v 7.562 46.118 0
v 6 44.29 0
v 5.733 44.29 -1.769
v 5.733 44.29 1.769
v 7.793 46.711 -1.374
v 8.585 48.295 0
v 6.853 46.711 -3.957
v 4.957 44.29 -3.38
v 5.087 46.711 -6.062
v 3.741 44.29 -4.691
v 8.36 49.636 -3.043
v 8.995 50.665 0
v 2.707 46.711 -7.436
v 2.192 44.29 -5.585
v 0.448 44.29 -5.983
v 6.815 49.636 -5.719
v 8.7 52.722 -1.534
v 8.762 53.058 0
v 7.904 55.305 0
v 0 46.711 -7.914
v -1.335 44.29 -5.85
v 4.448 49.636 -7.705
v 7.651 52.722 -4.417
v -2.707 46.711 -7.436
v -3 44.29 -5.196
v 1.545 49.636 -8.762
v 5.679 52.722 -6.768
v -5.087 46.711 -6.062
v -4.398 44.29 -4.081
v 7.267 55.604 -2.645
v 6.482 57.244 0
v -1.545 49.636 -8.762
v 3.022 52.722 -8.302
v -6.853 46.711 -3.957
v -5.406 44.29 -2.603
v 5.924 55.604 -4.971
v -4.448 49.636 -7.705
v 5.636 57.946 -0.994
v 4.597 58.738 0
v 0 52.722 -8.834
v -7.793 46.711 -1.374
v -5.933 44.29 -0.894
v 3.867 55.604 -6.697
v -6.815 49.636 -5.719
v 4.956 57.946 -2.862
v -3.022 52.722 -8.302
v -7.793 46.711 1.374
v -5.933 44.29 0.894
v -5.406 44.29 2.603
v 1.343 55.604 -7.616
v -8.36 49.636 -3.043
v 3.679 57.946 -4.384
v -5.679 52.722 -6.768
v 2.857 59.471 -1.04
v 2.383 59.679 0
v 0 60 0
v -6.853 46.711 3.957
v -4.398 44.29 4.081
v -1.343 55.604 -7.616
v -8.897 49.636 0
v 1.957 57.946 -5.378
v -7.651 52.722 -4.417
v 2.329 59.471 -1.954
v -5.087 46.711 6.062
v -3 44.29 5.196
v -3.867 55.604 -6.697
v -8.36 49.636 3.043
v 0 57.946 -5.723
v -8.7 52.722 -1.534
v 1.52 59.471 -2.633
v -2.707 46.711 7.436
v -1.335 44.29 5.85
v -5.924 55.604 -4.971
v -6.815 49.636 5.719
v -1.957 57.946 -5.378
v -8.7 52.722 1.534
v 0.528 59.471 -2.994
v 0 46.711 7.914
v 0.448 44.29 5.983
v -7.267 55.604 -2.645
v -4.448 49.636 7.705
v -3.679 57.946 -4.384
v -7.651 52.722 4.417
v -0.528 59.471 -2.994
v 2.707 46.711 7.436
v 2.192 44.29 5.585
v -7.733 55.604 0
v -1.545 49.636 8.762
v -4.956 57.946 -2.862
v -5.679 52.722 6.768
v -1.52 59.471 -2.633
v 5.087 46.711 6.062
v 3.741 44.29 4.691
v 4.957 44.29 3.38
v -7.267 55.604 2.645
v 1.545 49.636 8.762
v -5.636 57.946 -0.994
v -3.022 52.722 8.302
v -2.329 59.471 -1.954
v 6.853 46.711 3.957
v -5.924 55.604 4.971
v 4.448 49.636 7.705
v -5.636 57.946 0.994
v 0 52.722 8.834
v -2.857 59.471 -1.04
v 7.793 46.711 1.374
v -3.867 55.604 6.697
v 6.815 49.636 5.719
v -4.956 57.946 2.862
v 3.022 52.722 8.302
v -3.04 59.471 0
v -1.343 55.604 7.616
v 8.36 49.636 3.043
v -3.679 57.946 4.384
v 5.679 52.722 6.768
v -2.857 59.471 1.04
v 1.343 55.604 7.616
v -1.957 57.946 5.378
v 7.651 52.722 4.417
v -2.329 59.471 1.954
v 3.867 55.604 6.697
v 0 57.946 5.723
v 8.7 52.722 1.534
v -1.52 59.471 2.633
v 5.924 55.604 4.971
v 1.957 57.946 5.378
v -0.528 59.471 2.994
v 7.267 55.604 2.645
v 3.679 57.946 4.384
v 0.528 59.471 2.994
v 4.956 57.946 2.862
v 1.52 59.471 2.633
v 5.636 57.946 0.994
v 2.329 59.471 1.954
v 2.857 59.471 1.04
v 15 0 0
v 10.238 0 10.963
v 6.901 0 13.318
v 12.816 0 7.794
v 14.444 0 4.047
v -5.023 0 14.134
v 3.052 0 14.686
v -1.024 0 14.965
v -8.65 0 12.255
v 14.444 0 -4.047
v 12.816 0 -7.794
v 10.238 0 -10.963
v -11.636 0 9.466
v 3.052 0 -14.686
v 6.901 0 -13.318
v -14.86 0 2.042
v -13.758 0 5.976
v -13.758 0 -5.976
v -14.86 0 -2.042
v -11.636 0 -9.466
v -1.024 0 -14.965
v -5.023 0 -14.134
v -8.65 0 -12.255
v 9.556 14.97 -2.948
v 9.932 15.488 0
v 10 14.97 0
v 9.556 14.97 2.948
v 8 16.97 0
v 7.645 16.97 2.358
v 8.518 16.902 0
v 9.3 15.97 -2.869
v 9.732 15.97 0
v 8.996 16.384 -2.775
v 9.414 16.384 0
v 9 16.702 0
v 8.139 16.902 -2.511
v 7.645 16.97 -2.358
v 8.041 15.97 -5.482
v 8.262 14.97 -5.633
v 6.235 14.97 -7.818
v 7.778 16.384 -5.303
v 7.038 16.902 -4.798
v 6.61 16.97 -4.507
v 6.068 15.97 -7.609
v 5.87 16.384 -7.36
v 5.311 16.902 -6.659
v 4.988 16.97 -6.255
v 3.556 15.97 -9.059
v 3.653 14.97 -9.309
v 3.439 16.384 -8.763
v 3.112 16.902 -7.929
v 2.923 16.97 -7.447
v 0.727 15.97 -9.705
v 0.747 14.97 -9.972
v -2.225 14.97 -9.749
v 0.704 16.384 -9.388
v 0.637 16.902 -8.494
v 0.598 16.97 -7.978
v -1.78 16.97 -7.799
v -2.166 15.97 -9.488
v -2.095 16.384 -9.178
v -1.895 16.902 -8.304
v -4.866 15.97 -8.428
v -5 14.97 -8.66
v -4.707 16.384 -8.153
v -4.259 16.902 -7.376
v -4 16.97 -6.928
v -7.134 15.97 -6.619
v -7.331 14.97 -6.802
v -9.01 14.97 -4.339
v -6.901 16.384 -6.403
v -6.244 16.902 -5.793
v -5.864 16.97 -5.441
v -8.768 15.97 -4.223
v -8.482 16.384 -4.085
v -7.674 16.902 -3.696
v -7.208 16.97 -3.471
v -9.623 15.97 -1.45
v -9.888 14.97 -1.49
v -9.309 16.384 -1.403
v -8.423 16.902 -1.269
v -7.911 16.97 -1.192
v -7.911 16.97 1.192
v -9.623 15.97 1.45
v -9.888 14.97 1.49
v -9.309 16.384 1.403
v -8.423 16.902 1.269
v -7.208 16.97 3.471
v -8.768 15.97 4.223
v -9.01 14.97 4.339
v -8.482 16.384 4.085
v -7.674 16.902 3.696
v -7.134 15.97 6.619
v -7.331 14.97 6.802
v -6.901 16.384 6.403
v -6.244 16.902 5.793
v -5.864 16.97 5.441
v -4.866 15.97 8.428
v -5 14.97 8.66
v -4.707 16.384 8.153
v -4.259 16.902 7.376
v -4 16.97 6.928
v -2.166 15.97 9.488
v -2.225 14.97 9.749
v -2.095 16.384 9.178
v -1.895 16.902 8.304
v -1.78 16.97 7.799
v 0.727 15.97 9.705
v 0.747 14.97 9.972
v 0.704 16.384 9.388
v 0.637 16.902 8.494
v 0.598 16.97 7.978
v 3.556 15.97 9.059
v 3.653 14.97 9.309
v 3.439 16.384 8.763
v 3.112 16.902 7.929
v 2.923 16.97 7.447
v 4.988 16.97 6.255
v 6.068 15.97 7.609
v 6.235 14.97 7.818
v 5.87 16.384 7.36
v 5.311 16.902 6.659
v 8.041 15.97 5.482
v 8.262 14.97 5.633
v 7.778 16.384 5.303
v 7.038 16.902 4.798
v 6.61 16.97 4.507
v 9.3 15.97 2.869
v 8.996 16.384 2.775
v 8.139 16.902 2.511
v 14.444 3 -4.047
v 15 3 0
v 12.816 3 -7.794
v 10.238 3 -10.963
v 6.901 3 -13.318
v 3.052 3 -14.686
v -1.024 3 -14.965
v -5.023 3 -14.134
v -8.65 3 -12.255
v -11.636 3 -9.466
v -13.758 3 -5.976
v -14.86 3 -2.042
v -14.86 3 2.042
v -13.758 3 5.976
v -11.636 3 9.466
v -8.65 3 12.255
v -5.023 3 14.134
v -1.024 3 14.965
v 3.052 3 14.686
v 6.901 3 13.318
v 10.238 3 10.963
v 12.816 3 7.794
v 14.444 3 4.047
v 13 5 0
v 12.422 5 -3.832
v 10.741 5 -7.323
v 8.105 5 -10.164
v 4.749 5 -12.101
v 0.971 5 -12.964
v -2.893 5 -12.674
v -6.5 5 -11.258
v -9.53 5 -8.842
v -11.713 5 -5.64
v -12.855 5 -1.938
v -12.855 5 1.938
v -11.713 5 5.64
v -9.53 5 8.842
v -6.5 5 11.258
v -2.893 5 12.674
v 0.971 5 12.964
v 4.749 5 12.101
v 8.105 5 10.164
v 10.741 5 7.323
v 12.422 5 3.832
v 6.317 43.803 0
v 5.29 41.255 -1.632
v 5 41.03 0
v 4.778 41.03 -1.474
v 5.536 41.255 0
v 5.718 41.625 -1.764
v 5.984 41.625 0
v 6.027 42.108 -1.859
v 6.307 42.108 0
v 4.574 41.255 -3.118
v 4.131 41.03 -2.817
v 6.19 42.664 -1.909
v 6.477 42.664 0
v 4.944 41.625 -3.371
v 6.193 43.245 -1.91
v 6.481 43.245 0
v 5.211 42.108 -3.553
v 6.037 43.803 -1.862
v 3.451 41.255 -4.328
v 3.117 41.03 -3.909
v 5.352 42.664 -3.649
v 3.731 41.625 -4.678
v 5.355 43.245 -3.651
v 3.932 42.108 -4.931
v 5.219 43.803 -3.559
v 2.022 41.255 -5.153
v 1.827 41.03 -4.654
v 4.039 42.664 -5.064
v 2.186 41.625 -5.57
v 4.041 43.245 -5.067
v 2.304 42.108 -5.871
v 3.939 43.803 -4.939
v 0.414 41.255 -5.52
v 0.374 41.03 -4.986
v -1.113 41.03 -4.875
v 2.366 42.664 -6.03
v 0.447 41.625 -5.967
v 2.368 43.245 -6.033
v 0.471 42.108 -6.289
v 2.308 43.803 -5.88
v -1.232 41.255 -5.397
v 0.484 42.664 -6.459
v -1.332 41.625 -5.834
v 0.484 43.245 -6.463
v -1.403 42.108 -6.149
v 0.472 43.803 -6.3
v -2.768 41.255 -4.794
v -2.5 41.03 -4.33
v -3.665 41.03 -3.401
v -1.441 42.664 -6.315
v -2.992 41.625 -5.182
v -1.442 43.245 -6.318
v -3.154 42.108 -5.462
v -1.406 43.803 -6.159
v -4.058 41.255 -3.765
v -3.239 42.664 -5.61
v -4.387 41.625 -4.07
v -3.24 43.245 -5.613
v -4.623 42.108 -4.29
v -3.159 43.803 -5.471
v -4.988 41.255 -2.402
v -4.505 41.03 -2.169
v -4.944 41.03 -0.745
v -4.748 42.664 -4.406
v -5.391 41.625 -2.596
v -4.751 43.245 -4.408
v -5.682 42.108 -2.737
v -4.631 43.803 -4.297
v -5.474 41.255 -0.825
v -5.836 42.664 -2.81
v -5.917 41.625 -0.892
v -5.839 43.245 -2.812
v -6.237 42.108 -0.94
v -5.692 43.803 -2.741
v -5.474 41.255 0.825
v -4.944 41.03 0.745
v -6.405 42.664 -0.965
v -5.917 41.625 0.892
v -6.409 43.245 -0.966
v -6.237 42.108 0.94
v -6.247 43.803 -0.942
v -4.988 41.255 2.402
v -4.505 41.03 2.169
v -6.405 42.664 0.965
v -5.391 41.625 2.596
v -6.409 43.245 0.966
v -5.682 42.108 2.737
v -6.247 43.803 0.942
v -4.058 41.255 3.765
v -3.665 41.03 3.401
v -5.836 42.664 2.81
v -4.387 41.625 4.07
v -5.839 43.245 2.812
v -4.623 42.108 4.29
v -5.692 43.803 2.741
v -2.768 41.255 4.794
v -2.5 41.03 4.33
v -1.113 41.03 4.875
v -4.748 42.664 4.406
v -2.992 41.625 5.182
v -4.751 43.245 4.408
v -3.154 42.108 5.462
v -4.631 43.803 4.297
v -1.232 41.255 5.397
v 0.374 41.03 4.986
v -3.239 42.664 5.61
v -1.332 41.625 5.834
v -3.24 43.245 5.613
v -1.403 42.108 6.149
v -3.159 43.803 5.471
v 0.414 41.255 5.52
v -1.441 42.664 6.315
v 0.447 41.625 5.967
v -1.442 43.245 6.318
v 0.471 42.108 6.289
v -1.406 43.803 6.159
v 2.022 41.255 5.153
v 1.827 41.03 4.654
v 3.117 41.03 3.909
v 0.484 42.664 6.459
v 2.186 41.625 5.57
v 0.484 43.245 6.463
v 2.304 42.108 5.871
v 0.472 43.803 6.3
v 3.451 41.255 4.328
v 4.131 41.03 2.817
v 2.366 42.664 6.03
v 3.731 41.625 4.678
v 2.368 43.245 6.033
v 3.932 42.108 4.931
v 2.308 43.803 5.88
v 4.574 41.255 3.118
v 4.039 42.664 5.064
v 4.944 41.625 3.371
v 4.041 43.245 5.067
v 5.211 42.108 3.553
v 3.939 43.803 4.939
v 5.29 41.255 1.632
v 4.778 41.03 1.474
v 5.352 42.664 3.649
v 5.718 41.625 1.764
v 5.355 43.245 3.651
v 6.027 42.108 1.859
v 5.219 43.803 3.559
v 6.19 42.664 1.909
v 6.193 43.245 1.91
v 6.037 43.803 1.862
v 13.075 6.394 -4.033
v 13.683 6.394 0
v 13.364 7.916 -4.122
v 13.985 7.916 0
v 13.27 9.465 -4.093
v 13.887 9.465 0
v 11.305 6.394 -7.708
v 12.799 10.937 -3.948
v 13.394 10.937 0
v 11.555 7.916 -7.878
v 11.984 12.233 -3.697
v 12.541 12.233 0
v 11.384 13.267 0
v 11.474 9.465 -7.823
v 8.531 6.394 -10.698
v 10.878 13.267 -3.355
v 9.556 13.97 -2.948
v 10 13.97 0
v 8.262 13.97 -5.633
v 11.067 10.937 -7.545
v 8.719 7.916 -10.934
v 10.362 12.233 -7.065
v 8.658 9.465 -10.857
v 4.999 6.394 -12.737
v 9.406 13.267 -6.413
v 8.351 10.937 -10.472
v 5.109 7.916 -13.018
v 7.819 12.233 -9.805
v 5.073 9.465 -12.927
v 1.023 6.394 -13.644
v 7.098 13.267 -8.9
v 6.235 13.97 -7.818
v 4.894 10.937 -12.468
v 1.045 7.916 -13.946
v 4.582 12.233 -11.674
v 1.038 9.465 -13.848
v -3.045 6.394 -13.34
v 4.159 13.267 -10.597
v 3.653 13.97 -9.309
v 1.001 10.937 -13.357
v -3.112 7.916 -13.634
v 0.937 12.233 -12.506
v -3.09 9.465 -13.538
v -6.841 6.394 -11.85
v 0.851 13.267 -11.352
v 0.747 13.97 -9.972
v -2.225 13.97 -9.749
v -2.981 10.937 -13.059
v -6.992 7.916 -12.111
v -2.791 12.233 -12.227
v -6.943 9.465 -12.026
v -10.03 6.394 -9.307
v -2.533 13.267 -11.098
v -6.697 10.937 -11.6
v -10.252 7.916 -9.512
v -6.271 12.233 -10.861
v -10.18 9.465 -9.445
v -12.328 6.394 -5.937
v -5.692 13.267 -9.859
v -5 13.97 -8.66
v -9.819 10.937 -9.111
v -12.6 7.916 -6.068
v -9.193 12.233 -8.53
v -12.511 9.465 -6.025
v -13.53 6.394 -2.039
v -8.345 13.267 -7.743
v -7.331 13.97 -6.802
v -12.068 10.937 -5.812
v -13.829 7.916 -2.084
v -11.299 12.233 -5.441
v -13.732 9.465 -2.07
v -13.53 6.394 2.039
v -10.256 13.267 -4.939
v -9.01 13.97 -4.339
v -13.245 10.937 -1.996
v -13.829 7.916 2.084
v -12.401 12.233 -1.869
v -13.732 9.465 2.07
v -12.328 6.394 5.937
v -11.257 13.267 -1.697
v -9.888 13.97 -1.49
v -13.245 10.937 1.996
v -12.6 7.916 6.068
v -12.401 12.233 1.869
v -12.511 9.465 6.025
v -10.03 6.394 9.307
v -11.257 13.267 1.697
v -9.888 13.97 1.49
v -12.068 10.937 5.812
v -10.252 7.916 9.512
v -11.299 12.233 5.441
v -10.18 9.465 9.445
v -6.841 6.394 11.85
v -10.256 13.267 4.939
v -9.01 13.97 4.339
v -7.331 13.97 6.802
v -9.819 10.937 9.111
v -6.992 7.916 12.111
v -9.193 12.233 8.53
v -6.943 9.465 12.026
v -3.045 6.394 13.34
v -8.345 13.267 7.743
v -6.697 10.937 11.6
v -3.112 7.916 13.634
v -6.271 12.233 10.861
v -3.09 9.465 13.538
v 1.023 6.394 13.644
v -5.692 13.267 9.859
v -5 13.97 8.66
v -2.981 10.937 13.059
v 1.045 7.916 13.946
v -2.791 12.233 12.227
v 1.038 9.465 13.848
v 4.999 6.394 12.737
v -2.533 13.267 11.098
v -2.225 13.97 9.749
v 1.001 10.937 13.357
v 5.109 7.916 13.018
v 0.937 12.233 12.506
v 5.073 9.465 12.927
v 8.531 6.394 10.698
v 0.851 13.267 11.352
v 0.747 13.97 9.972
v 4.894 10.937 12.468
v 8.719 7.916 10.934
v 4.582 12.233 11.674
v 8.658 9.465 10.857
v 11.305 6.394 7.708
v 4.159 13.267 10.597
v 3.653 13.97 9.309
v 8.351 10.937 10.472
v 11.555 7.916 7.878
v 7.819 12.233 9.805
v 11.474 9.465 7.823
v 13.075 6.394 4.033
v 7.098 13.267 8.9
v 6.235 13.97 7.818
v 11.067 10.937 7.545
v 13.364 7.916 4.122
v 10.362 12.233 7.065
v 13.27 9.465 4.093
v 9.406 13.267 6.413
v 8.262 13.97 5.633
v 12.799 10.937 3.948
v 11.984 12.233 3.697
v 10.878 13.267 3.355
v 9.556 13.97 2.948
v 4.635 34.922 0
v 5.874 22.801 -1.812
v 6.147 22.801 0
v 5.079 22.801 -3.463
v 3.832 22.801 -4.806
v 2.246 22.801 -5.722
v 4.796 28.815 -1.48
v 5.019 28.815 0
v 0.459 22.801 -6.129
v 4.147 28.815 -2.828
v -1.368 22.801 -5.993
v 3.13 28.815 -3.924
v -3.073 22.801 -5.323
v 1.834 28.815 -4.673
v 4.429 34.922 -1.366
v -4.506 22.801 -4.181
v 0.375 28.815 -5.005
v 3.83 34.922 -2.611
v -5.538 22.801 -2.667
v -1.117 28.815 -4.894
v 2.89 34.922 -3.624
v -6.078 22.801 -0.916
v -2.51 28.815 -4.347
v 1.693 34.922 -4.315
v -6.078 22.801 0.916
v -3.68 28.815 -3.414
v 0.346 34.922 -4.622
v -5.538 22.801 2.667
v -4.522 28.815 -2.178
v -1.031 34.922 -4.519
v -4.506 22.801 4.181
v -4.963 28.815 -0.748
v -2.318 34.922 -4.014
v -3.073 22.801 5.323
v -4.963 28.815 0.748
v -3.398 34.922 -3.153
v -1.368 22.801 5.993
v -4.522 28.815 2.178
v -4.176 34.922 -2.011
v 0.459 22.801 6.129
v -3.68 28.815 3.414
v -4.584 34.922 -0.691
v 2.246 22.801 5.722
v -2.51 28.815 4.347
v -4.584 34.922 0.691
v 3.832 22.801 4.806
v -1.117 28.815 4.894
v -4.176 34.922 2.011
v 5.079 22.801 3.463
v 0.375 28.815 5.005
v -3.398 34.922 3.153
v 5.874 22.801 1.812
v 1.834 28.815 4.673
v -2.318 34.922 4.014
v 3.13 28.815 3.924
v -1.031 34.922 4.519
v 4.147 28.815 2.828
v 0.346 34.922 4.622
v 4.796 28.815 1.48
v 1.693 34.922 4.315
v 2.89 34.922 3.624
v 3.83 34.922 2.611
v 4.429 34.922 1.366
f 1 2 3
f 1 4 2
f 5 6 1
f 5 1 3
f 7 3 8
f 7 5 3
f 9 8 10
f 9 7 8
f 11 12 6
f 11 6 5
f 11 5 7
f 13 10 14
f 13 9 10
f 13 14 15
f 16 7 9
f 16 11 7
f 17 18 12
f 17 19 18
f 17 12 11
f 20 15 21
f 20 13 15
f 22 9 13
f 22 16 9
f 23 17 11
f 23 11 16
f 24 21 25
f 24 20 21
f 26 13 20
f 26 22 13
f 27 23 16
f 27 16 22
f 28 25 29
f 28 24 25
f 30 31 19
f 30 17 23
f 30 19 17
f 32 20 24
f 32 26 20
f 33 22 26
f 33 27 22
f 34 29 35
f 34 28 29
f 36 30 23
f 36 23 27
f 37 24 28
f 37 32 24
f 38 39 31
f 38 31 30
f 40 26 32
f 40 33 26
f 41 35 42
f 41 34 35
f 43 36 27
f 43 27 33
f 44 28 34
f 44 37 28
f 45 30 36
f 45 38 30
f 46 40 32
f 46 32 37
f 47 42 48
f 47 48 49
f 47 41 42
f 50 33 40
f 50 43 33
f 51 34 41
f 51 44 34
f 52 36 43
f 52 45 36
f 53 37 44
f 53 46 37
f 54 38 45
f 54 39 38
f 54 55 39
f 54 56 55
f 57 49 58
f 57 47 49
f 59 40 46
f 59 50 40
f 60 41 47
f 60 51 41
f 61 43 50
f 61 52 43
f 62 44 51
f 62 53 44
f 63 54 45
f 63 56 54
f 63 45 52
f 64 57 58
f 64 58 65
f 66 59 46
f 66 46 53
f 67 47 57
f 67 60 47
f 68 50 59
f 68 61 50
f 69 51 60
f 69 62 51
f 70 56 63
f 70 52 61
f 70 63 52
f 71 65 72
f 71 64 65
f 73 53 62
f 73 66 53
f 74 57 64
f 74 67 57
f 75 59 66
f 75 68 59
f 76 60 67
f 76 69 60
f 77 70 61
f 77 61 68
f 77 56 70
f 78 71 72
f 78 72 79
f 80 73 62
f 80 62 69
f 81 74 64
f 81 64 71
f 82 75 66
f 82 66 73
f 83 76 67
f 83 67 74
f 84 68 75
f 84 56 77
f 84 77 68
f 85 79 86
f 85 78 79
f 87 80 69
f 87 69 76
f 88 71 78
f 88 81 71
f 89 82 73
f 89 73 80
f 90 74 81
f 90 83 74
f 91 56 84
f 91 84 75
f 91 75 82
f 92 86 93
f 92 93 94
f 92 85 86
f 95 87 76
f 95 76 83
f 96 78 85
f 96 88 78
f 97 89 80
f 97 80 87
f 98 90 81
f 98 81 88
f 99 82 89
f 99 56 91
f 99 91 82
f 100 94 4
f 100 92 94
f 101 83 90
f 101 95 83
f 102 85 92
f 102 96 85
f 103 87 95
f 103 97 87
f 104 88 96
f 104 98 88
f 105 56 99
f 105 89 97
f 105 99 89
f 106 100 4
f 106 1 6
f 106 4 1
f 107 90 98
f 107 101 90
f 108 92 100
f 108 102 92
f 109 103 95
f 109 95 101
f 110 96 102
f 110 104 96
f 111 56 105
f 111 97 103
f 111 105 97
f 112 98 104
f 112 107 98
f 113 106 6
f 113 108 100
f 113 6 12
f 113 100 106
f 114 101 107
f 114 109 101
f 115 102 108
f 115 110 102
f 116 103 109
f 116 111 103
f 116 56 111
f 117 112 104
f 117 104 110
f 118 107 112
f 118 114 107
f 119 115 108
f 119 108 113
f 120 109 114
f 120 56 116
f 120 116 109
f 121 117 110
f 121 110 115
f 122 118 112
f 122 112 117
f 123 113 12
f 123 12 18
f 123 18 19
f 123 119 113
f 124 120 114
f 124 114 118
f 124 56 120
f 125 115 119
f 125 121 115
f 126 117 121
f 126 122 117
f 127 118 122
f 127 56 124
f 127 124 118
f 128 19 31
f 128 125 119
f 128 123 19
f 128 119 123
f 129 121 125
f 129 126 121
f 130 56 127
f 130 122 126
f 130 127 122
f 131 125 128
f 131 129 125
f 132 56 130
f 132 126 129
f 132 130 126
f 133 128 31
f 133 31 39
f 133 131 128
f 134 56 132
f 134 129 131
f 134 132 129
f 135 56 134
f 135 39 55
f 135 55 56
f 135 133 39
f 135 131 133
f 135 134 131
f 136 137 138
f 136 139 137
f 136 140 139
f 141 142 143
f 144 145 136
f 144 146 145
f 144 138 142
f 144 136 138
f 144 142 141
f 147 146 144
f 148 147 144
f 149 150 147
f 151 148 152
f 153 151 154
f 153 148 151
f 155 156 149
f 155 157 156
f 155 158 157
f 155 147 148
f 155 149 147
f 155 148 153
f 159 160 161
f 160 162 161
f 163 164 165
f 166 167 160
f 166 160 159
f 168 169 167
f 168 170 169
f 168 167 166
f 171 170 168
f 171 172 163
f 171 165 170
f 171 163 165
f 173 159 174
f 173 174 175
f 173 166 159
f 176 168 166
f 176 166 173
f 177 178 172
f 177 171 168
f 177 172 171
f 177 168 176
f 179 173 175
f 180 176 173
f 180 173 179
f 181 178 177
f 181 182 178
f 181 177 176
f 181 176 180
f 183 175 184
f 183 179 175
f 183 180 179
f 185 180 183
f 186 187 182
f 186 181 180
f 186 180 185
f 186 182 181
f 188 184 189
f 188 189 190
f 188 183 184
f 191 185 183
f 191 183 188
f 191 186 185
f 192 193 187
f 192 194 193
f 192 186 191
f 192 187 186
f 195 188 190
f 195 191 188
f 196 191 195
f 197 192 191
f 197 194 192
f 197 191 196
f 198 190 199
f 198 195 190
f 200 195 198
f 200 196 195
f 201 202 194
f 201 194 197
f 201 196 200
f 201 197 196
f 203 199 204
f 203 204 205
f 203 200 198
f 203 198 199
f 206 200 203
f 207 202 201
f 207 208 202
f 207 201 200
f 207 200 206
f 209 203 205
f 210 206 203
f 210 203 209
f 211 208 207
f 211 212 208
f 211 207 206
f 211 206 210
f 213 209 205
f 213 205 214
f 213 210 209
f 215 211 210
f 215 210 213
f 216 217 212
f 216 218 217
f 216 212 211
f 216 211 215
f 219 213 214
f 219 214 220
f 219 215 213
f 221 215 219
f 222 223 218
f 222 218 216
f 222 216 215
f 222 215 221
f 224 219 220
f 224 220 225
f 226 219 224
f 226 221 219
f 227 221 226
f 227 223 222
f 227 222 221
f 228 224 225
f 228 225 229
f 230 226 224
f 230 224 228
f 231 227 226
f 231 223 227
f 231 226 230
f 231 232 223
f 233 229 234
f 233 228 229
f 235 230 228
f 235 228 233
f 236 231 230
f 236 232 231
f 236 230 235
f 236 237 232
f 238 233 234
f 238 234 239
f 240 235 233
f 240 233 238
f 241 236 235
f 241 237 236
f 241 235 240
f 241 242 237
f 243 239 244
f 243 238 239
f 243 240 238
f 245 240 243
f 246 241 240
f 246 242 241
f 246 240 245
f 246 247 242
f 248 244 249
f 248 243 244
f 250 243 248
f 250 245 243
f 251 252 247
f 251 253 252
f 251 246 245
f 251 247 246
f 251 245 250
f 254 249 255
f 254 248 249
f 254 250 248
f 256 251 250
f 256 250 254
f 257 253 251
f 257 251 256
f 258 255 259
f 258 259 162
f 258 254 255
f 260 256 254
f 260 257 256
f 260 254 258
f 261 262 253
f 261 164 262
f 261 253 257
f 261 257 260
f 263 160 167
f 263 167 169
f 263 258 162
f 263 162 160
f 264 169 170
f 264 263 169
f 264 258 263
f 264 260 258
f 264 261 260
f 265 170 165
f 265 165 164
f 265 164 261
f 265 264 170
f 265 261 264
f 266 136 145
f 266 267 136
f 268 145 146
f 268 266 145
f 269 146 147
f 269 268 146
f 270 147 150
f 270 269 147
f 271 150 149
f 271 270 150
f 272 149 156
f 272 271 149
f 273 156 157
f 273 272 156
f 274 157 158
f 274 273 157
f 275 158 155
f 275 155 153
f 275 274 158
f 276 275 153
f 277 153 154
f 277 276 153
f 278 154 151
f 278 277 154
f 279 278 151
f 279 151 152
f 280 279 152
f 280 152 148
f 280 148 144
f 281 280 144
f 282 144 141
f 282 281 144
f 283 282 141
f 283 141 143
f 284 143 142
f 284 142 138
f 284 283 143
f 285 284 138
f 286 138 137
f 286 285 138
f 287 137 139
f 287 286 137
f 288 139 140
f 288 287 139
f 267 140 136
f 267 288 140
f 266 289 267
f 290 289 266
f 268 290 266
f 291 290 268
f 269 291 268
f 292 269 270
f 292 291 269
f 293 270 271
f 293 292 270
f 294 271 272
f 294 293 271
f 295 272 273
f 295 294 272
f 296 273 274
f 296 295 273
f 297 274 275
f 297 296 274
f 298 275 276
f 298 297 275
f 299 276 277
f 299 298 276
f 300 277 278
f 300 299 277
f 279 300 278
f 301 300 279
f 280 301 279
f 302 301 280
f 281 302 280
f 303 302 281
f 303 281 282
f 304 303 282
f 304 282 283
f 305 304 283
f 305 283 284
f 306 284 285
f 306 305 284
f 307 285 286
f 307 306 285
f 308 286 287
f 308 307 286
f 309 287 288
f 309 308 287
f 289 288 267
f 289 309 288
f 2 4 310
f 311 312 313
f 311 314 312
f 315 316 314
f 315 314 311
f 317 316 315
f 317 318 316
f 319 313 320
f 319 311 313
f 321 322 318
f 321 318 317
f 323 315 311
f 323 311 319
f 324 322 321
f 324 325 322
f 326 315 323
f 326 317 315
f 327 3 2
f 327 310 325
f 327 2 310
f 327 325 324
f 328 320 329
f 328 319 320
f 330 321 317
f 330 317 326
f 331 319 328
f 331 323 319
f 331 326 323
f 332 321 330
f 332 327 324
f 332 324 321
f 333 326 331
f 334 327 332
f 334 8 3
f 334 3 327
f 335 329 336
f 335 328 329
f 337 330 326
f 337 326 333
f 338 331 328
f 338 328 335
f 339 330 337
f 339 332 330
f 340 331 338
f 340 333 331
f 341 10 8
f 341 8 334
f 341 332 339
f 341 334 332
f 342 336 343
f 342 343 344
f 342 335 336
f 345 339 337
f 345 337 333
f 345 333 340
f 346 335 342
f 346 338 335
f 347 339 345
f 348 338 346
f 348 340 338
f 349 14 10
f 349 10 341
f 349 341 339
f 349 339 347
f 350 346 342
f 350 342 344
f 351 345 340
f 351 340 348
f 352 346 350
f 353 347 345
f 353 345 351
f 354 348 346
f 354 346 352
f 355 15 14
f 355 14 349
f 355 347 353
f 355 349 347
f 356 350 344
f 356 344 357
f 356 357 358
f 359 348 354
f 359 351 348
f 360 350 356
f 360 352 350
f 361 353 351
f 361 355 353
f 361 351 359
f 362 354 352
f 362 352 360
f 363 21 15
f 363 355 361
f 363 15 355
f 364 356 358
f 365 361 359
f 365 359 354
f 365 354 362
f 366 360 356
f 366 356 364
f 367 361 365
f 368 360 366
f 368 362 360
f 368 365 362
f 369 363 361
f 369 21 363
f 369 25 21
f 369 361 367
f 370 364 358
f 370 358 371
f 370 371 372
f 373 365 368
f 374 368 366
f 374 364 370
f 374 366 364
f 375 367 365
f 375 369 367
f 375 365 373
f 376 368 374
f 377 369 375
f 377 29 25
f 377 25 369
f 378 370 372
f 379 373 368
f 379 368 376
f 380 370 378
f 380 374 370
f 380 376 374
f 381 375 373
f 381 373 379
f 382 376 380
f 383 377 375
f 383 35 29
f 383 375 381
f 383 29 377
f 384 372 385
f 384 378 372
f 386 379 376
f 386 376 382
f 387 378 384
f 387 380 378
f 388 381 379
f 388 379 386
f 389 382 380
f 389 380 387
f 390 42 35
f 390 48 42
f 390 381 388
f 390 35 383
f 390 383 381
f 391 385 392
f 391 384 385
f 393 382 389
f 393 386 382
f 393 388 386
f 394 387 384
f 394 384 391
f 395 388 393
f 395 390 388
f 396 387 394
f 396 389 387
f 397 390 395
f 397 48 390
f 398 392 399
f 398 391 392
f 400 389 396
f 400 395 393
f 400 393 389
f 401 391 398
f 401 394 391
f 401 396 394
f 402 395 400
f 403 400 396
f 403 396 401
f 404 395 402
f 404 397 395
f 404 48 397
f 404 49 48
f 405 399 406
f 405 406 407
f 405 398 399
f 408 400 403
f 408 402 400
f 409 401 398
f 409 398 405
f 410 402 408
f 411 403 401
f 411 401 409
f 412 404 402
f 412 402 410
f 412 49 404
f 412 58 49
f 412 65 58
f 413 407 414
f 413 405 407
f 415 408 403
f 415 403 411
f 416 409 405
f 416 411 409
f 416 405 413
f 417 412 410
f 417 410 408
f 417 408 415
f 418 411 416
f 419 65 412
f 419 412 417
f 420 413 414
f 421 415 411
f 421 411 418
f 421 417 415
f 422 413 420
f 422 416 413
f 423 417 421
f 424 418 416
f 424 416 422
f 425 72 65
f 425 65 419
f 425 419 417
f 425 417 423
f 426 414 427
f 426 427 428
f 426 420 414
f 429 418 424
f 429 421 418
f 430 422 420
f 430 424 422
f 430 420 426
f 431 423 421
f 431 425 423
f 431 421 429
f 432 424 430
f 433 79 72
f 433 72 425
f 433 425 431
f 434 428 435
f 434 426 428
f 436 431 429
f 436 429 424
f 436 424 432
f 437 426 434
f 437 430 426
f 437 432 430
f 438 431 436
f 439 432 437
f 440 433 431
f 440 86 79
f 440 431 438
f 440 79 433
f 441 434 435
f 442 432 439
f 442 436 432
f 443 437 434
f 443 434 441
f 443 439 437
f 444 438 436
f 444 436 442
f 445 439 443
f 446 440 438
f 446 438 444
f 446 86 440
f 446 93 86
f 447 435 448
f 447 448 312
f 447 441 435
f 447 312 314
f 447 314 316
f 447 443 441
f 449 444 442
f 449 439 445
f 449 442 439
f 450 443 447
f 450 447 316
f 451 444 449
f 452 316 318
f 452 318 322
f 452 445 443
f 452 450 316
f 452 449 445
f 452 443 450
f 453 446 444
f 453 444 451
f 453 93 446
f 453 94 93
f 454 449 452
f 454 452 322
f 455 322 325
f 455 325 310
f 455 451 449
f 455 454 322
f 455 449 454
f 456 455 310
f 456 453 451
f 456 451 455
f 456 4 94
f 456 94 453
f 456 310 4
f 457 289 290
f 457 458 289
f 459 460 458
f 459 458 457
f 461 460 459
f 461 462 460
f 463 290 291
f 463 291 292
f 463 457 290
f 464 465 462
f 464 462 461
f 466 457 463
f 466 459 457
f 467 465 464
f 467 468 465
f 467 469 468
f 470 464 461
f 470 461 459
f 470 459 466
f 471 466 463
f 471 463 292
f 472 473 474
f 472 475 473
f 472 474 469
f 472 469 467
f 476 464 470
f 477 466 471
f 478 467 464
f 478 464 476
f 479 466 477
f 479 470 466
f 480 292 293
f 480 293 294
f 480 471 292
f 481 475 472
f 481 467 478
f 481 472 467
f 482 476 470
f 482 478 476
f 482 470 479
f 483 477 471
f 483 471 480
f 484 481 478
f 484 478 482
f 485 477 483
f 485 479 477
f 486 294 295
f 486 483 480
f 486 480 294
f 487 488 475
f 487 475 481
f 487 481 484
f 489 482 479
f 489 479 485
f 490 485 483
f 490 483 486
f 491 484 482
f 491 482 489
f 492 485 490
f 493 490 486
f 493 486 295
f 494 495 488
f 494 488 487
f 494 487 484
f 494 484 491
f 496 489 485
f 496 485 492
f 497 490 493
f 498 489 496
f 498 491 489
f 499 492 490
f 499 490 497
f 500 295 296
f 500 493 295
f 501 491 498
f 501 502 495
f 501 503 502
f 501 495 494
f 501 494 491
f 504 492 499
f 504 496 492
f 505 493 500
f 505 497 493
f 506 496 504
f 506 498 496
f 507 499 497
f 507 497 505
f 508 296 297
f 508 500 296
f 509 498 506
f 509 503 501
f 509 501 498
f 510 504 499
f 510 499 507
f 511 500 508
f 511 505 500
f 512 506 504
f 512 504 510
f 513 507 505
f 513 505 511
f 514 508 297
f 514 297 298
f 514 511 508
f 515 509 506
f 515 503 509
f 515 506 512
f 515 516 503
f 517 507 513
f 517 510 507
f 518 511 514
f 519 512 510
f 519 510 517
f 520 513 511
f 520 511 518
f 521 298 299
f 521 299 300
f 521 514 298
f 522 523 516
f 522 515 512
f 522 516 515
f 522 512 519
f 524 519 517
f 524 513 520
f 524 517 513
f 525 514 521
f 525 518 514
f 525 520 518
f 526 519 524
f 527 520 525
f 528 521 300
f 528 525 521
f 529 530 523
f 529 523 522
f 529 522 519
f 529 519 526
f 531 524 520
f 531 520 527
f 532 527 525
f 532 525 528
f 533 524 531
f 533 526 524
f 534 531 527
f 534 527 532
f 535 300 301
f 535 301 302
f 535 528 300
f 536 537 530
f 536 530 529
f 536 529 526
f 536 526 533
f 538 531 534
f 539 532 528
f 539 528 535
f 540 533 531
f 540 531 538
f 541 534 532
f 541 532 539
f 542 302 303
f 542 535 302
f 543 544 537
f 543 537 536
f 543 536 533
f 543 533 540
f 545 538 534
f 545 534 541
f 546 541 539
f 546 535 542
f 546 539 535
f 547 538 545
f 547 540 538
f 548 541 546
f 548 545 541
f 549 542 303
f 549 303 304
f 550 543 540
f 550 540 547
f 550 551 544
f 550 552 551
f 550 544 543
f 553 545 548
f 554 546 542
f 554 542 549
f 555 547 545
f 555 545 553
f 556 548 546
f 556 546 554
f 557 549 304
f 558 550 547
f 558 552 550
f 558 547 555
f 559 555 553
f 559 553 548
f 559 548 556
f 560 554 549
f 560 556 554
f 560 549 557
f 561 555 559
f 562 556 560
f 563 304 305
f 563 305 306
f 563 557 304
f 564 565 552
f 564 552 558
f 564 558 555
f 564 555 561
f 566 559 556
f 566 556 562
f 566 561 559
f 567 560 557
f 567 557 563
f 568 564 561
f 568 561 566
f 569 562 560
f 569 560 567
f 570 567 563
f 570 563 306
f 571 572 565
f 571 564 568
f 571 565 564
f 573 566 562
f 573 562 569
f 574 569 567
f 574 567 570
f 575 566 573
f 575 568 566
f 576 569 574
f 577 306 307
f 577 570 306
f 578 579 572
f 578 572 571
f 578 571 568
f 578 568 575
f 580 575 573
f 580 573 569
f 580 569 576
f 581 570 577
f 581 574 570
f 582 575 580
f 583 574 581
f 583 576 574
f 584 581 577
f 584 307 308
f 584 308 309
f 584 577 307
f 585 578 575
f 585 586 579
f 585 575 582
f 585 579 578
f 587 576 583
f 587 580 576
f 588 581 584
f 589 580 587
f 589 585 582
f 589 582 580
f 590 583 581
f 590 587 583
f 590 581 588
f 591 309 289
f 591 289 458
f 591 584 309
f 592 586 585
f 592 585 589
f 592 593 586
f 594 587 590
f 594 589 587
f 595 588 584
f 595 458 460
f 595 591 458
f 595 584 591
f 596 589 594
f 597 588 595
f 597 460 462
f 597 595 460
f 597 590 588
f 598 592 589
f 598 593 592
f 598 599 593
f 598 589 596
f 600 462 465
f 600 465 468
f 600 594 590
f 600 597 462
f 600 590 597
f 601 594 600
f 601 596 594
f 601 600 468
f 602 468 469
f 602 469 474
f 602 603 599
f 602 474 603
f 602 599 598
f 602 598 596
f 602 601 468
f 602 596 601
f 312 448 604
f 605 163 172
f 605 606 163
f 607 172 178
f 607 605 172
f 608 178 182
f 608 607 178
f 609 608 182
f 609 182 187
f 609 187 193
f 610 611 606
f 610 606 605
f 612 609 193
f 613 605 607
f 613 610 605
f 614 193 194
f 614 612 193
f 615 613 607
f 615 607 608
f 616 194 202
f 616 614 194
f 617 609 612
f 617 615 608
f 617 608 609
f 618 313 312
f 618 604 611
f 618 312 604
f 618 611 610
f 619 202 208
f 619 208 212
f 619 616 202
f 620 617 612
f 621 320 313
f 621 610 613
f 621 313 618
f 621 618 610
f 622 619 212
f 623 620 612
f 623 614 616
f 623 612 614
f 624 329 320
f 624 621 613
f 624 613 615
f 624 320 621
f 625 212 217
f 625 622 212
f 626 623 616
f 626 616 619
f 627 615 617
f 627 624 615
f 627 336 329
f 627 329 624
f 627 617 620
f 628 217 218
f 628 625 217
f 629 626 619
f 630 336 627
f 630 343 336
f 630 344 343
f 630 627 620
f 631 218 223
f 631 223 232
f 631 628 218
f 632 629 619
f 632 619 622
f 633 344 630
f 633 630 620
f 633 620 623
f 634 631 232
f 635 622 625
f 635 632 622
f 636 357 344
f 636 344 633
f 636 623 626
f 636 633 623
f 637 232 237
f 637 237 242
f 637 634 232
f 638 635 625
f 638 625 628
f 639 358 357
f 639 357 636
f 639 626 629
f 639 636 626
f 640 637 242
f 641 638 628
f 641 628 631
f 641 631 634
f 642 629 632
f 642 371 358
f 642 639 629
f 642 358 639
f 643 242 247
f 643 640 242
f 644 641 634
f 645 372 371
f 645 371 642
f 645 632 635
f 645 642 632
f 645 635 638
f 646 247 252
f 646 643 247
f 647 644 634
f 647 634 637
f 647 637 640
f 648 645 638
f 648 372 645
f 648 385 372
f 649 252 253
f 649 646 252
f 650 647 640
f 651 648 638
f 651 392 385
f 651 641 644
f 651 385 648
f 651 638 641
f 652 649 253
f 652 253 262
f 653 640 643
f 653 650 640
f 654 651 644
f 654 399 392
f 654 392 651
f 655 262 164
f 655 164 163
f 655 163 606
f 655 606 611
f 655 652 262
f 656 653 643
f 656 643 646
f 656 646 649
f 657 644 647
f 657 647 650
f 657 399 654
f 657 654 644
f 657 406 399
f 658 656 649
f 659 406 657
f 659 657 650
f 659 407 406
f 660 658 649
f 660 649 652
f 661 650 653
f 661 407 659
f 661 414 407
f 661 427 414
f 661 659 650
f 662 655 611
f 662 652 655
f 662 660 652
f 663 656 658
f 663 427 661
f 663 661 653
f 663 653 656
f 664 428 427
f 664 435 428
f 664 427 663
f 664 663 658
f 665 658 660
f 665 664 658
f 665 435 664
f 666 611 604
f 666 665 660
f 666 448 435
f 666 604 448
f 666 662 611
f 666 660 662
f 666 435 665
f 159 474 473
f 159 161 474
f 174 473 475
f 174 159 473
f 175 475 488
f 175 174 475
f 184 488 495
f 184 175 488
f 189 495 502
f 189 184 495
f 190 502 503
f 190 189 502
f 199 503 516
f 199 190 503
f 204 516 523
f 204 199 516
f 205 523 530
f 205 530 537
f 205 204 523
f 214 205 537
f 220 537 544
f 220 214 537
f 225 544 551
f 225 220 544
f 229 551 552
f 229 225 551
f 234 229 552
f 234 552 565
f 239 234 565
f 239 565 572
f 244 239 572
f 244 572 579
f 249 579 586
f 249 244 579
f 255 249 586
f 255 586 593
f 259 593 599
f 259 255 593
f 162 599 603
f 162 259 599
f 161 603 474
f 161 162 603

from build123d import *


with BuildPart() as part:
    # Sketch1 → Revolve3 (revolve)
    with BuildSketch(Plane.XY, mode=Mode.PRIVATE) as revolve3_sk:
        with BuildLine():
            Line((0, 0), (-15, 0))
            Line((-15, 0), (-15, 3))
            Line((-15, 3), (-13, 5))
            ThreePointArc((-13, 5), (-13.688325627, 10.216881481), (-10, 13.97))
            Line((-10, 13.97), (-10, 14.97))
            ThreePointArc((-10, 14.97), (-9.414213562, 16.384213562), (-8, 16.97))
            ThreePointArc((-8, 16.97), (-5.019495729, 28.81539847), (-5, 41.03))
            ThreePointArc((-5, 41.03), (-6.412519214, 42.380086131), (-6, 44.29))
            ThreePointArc((-6, 44.29), (-8.408390155, 54.210585037), (0, 60))
            Line((0, 60), (0, 0))
        make_face()
    revolve(revolve3_sk.sketch.rotate(Axis((0, 0, 0), (0, 1, 0)), 180), axis=Axis((0, 0, 0), (0, 1, 0)))


solid = part.part
